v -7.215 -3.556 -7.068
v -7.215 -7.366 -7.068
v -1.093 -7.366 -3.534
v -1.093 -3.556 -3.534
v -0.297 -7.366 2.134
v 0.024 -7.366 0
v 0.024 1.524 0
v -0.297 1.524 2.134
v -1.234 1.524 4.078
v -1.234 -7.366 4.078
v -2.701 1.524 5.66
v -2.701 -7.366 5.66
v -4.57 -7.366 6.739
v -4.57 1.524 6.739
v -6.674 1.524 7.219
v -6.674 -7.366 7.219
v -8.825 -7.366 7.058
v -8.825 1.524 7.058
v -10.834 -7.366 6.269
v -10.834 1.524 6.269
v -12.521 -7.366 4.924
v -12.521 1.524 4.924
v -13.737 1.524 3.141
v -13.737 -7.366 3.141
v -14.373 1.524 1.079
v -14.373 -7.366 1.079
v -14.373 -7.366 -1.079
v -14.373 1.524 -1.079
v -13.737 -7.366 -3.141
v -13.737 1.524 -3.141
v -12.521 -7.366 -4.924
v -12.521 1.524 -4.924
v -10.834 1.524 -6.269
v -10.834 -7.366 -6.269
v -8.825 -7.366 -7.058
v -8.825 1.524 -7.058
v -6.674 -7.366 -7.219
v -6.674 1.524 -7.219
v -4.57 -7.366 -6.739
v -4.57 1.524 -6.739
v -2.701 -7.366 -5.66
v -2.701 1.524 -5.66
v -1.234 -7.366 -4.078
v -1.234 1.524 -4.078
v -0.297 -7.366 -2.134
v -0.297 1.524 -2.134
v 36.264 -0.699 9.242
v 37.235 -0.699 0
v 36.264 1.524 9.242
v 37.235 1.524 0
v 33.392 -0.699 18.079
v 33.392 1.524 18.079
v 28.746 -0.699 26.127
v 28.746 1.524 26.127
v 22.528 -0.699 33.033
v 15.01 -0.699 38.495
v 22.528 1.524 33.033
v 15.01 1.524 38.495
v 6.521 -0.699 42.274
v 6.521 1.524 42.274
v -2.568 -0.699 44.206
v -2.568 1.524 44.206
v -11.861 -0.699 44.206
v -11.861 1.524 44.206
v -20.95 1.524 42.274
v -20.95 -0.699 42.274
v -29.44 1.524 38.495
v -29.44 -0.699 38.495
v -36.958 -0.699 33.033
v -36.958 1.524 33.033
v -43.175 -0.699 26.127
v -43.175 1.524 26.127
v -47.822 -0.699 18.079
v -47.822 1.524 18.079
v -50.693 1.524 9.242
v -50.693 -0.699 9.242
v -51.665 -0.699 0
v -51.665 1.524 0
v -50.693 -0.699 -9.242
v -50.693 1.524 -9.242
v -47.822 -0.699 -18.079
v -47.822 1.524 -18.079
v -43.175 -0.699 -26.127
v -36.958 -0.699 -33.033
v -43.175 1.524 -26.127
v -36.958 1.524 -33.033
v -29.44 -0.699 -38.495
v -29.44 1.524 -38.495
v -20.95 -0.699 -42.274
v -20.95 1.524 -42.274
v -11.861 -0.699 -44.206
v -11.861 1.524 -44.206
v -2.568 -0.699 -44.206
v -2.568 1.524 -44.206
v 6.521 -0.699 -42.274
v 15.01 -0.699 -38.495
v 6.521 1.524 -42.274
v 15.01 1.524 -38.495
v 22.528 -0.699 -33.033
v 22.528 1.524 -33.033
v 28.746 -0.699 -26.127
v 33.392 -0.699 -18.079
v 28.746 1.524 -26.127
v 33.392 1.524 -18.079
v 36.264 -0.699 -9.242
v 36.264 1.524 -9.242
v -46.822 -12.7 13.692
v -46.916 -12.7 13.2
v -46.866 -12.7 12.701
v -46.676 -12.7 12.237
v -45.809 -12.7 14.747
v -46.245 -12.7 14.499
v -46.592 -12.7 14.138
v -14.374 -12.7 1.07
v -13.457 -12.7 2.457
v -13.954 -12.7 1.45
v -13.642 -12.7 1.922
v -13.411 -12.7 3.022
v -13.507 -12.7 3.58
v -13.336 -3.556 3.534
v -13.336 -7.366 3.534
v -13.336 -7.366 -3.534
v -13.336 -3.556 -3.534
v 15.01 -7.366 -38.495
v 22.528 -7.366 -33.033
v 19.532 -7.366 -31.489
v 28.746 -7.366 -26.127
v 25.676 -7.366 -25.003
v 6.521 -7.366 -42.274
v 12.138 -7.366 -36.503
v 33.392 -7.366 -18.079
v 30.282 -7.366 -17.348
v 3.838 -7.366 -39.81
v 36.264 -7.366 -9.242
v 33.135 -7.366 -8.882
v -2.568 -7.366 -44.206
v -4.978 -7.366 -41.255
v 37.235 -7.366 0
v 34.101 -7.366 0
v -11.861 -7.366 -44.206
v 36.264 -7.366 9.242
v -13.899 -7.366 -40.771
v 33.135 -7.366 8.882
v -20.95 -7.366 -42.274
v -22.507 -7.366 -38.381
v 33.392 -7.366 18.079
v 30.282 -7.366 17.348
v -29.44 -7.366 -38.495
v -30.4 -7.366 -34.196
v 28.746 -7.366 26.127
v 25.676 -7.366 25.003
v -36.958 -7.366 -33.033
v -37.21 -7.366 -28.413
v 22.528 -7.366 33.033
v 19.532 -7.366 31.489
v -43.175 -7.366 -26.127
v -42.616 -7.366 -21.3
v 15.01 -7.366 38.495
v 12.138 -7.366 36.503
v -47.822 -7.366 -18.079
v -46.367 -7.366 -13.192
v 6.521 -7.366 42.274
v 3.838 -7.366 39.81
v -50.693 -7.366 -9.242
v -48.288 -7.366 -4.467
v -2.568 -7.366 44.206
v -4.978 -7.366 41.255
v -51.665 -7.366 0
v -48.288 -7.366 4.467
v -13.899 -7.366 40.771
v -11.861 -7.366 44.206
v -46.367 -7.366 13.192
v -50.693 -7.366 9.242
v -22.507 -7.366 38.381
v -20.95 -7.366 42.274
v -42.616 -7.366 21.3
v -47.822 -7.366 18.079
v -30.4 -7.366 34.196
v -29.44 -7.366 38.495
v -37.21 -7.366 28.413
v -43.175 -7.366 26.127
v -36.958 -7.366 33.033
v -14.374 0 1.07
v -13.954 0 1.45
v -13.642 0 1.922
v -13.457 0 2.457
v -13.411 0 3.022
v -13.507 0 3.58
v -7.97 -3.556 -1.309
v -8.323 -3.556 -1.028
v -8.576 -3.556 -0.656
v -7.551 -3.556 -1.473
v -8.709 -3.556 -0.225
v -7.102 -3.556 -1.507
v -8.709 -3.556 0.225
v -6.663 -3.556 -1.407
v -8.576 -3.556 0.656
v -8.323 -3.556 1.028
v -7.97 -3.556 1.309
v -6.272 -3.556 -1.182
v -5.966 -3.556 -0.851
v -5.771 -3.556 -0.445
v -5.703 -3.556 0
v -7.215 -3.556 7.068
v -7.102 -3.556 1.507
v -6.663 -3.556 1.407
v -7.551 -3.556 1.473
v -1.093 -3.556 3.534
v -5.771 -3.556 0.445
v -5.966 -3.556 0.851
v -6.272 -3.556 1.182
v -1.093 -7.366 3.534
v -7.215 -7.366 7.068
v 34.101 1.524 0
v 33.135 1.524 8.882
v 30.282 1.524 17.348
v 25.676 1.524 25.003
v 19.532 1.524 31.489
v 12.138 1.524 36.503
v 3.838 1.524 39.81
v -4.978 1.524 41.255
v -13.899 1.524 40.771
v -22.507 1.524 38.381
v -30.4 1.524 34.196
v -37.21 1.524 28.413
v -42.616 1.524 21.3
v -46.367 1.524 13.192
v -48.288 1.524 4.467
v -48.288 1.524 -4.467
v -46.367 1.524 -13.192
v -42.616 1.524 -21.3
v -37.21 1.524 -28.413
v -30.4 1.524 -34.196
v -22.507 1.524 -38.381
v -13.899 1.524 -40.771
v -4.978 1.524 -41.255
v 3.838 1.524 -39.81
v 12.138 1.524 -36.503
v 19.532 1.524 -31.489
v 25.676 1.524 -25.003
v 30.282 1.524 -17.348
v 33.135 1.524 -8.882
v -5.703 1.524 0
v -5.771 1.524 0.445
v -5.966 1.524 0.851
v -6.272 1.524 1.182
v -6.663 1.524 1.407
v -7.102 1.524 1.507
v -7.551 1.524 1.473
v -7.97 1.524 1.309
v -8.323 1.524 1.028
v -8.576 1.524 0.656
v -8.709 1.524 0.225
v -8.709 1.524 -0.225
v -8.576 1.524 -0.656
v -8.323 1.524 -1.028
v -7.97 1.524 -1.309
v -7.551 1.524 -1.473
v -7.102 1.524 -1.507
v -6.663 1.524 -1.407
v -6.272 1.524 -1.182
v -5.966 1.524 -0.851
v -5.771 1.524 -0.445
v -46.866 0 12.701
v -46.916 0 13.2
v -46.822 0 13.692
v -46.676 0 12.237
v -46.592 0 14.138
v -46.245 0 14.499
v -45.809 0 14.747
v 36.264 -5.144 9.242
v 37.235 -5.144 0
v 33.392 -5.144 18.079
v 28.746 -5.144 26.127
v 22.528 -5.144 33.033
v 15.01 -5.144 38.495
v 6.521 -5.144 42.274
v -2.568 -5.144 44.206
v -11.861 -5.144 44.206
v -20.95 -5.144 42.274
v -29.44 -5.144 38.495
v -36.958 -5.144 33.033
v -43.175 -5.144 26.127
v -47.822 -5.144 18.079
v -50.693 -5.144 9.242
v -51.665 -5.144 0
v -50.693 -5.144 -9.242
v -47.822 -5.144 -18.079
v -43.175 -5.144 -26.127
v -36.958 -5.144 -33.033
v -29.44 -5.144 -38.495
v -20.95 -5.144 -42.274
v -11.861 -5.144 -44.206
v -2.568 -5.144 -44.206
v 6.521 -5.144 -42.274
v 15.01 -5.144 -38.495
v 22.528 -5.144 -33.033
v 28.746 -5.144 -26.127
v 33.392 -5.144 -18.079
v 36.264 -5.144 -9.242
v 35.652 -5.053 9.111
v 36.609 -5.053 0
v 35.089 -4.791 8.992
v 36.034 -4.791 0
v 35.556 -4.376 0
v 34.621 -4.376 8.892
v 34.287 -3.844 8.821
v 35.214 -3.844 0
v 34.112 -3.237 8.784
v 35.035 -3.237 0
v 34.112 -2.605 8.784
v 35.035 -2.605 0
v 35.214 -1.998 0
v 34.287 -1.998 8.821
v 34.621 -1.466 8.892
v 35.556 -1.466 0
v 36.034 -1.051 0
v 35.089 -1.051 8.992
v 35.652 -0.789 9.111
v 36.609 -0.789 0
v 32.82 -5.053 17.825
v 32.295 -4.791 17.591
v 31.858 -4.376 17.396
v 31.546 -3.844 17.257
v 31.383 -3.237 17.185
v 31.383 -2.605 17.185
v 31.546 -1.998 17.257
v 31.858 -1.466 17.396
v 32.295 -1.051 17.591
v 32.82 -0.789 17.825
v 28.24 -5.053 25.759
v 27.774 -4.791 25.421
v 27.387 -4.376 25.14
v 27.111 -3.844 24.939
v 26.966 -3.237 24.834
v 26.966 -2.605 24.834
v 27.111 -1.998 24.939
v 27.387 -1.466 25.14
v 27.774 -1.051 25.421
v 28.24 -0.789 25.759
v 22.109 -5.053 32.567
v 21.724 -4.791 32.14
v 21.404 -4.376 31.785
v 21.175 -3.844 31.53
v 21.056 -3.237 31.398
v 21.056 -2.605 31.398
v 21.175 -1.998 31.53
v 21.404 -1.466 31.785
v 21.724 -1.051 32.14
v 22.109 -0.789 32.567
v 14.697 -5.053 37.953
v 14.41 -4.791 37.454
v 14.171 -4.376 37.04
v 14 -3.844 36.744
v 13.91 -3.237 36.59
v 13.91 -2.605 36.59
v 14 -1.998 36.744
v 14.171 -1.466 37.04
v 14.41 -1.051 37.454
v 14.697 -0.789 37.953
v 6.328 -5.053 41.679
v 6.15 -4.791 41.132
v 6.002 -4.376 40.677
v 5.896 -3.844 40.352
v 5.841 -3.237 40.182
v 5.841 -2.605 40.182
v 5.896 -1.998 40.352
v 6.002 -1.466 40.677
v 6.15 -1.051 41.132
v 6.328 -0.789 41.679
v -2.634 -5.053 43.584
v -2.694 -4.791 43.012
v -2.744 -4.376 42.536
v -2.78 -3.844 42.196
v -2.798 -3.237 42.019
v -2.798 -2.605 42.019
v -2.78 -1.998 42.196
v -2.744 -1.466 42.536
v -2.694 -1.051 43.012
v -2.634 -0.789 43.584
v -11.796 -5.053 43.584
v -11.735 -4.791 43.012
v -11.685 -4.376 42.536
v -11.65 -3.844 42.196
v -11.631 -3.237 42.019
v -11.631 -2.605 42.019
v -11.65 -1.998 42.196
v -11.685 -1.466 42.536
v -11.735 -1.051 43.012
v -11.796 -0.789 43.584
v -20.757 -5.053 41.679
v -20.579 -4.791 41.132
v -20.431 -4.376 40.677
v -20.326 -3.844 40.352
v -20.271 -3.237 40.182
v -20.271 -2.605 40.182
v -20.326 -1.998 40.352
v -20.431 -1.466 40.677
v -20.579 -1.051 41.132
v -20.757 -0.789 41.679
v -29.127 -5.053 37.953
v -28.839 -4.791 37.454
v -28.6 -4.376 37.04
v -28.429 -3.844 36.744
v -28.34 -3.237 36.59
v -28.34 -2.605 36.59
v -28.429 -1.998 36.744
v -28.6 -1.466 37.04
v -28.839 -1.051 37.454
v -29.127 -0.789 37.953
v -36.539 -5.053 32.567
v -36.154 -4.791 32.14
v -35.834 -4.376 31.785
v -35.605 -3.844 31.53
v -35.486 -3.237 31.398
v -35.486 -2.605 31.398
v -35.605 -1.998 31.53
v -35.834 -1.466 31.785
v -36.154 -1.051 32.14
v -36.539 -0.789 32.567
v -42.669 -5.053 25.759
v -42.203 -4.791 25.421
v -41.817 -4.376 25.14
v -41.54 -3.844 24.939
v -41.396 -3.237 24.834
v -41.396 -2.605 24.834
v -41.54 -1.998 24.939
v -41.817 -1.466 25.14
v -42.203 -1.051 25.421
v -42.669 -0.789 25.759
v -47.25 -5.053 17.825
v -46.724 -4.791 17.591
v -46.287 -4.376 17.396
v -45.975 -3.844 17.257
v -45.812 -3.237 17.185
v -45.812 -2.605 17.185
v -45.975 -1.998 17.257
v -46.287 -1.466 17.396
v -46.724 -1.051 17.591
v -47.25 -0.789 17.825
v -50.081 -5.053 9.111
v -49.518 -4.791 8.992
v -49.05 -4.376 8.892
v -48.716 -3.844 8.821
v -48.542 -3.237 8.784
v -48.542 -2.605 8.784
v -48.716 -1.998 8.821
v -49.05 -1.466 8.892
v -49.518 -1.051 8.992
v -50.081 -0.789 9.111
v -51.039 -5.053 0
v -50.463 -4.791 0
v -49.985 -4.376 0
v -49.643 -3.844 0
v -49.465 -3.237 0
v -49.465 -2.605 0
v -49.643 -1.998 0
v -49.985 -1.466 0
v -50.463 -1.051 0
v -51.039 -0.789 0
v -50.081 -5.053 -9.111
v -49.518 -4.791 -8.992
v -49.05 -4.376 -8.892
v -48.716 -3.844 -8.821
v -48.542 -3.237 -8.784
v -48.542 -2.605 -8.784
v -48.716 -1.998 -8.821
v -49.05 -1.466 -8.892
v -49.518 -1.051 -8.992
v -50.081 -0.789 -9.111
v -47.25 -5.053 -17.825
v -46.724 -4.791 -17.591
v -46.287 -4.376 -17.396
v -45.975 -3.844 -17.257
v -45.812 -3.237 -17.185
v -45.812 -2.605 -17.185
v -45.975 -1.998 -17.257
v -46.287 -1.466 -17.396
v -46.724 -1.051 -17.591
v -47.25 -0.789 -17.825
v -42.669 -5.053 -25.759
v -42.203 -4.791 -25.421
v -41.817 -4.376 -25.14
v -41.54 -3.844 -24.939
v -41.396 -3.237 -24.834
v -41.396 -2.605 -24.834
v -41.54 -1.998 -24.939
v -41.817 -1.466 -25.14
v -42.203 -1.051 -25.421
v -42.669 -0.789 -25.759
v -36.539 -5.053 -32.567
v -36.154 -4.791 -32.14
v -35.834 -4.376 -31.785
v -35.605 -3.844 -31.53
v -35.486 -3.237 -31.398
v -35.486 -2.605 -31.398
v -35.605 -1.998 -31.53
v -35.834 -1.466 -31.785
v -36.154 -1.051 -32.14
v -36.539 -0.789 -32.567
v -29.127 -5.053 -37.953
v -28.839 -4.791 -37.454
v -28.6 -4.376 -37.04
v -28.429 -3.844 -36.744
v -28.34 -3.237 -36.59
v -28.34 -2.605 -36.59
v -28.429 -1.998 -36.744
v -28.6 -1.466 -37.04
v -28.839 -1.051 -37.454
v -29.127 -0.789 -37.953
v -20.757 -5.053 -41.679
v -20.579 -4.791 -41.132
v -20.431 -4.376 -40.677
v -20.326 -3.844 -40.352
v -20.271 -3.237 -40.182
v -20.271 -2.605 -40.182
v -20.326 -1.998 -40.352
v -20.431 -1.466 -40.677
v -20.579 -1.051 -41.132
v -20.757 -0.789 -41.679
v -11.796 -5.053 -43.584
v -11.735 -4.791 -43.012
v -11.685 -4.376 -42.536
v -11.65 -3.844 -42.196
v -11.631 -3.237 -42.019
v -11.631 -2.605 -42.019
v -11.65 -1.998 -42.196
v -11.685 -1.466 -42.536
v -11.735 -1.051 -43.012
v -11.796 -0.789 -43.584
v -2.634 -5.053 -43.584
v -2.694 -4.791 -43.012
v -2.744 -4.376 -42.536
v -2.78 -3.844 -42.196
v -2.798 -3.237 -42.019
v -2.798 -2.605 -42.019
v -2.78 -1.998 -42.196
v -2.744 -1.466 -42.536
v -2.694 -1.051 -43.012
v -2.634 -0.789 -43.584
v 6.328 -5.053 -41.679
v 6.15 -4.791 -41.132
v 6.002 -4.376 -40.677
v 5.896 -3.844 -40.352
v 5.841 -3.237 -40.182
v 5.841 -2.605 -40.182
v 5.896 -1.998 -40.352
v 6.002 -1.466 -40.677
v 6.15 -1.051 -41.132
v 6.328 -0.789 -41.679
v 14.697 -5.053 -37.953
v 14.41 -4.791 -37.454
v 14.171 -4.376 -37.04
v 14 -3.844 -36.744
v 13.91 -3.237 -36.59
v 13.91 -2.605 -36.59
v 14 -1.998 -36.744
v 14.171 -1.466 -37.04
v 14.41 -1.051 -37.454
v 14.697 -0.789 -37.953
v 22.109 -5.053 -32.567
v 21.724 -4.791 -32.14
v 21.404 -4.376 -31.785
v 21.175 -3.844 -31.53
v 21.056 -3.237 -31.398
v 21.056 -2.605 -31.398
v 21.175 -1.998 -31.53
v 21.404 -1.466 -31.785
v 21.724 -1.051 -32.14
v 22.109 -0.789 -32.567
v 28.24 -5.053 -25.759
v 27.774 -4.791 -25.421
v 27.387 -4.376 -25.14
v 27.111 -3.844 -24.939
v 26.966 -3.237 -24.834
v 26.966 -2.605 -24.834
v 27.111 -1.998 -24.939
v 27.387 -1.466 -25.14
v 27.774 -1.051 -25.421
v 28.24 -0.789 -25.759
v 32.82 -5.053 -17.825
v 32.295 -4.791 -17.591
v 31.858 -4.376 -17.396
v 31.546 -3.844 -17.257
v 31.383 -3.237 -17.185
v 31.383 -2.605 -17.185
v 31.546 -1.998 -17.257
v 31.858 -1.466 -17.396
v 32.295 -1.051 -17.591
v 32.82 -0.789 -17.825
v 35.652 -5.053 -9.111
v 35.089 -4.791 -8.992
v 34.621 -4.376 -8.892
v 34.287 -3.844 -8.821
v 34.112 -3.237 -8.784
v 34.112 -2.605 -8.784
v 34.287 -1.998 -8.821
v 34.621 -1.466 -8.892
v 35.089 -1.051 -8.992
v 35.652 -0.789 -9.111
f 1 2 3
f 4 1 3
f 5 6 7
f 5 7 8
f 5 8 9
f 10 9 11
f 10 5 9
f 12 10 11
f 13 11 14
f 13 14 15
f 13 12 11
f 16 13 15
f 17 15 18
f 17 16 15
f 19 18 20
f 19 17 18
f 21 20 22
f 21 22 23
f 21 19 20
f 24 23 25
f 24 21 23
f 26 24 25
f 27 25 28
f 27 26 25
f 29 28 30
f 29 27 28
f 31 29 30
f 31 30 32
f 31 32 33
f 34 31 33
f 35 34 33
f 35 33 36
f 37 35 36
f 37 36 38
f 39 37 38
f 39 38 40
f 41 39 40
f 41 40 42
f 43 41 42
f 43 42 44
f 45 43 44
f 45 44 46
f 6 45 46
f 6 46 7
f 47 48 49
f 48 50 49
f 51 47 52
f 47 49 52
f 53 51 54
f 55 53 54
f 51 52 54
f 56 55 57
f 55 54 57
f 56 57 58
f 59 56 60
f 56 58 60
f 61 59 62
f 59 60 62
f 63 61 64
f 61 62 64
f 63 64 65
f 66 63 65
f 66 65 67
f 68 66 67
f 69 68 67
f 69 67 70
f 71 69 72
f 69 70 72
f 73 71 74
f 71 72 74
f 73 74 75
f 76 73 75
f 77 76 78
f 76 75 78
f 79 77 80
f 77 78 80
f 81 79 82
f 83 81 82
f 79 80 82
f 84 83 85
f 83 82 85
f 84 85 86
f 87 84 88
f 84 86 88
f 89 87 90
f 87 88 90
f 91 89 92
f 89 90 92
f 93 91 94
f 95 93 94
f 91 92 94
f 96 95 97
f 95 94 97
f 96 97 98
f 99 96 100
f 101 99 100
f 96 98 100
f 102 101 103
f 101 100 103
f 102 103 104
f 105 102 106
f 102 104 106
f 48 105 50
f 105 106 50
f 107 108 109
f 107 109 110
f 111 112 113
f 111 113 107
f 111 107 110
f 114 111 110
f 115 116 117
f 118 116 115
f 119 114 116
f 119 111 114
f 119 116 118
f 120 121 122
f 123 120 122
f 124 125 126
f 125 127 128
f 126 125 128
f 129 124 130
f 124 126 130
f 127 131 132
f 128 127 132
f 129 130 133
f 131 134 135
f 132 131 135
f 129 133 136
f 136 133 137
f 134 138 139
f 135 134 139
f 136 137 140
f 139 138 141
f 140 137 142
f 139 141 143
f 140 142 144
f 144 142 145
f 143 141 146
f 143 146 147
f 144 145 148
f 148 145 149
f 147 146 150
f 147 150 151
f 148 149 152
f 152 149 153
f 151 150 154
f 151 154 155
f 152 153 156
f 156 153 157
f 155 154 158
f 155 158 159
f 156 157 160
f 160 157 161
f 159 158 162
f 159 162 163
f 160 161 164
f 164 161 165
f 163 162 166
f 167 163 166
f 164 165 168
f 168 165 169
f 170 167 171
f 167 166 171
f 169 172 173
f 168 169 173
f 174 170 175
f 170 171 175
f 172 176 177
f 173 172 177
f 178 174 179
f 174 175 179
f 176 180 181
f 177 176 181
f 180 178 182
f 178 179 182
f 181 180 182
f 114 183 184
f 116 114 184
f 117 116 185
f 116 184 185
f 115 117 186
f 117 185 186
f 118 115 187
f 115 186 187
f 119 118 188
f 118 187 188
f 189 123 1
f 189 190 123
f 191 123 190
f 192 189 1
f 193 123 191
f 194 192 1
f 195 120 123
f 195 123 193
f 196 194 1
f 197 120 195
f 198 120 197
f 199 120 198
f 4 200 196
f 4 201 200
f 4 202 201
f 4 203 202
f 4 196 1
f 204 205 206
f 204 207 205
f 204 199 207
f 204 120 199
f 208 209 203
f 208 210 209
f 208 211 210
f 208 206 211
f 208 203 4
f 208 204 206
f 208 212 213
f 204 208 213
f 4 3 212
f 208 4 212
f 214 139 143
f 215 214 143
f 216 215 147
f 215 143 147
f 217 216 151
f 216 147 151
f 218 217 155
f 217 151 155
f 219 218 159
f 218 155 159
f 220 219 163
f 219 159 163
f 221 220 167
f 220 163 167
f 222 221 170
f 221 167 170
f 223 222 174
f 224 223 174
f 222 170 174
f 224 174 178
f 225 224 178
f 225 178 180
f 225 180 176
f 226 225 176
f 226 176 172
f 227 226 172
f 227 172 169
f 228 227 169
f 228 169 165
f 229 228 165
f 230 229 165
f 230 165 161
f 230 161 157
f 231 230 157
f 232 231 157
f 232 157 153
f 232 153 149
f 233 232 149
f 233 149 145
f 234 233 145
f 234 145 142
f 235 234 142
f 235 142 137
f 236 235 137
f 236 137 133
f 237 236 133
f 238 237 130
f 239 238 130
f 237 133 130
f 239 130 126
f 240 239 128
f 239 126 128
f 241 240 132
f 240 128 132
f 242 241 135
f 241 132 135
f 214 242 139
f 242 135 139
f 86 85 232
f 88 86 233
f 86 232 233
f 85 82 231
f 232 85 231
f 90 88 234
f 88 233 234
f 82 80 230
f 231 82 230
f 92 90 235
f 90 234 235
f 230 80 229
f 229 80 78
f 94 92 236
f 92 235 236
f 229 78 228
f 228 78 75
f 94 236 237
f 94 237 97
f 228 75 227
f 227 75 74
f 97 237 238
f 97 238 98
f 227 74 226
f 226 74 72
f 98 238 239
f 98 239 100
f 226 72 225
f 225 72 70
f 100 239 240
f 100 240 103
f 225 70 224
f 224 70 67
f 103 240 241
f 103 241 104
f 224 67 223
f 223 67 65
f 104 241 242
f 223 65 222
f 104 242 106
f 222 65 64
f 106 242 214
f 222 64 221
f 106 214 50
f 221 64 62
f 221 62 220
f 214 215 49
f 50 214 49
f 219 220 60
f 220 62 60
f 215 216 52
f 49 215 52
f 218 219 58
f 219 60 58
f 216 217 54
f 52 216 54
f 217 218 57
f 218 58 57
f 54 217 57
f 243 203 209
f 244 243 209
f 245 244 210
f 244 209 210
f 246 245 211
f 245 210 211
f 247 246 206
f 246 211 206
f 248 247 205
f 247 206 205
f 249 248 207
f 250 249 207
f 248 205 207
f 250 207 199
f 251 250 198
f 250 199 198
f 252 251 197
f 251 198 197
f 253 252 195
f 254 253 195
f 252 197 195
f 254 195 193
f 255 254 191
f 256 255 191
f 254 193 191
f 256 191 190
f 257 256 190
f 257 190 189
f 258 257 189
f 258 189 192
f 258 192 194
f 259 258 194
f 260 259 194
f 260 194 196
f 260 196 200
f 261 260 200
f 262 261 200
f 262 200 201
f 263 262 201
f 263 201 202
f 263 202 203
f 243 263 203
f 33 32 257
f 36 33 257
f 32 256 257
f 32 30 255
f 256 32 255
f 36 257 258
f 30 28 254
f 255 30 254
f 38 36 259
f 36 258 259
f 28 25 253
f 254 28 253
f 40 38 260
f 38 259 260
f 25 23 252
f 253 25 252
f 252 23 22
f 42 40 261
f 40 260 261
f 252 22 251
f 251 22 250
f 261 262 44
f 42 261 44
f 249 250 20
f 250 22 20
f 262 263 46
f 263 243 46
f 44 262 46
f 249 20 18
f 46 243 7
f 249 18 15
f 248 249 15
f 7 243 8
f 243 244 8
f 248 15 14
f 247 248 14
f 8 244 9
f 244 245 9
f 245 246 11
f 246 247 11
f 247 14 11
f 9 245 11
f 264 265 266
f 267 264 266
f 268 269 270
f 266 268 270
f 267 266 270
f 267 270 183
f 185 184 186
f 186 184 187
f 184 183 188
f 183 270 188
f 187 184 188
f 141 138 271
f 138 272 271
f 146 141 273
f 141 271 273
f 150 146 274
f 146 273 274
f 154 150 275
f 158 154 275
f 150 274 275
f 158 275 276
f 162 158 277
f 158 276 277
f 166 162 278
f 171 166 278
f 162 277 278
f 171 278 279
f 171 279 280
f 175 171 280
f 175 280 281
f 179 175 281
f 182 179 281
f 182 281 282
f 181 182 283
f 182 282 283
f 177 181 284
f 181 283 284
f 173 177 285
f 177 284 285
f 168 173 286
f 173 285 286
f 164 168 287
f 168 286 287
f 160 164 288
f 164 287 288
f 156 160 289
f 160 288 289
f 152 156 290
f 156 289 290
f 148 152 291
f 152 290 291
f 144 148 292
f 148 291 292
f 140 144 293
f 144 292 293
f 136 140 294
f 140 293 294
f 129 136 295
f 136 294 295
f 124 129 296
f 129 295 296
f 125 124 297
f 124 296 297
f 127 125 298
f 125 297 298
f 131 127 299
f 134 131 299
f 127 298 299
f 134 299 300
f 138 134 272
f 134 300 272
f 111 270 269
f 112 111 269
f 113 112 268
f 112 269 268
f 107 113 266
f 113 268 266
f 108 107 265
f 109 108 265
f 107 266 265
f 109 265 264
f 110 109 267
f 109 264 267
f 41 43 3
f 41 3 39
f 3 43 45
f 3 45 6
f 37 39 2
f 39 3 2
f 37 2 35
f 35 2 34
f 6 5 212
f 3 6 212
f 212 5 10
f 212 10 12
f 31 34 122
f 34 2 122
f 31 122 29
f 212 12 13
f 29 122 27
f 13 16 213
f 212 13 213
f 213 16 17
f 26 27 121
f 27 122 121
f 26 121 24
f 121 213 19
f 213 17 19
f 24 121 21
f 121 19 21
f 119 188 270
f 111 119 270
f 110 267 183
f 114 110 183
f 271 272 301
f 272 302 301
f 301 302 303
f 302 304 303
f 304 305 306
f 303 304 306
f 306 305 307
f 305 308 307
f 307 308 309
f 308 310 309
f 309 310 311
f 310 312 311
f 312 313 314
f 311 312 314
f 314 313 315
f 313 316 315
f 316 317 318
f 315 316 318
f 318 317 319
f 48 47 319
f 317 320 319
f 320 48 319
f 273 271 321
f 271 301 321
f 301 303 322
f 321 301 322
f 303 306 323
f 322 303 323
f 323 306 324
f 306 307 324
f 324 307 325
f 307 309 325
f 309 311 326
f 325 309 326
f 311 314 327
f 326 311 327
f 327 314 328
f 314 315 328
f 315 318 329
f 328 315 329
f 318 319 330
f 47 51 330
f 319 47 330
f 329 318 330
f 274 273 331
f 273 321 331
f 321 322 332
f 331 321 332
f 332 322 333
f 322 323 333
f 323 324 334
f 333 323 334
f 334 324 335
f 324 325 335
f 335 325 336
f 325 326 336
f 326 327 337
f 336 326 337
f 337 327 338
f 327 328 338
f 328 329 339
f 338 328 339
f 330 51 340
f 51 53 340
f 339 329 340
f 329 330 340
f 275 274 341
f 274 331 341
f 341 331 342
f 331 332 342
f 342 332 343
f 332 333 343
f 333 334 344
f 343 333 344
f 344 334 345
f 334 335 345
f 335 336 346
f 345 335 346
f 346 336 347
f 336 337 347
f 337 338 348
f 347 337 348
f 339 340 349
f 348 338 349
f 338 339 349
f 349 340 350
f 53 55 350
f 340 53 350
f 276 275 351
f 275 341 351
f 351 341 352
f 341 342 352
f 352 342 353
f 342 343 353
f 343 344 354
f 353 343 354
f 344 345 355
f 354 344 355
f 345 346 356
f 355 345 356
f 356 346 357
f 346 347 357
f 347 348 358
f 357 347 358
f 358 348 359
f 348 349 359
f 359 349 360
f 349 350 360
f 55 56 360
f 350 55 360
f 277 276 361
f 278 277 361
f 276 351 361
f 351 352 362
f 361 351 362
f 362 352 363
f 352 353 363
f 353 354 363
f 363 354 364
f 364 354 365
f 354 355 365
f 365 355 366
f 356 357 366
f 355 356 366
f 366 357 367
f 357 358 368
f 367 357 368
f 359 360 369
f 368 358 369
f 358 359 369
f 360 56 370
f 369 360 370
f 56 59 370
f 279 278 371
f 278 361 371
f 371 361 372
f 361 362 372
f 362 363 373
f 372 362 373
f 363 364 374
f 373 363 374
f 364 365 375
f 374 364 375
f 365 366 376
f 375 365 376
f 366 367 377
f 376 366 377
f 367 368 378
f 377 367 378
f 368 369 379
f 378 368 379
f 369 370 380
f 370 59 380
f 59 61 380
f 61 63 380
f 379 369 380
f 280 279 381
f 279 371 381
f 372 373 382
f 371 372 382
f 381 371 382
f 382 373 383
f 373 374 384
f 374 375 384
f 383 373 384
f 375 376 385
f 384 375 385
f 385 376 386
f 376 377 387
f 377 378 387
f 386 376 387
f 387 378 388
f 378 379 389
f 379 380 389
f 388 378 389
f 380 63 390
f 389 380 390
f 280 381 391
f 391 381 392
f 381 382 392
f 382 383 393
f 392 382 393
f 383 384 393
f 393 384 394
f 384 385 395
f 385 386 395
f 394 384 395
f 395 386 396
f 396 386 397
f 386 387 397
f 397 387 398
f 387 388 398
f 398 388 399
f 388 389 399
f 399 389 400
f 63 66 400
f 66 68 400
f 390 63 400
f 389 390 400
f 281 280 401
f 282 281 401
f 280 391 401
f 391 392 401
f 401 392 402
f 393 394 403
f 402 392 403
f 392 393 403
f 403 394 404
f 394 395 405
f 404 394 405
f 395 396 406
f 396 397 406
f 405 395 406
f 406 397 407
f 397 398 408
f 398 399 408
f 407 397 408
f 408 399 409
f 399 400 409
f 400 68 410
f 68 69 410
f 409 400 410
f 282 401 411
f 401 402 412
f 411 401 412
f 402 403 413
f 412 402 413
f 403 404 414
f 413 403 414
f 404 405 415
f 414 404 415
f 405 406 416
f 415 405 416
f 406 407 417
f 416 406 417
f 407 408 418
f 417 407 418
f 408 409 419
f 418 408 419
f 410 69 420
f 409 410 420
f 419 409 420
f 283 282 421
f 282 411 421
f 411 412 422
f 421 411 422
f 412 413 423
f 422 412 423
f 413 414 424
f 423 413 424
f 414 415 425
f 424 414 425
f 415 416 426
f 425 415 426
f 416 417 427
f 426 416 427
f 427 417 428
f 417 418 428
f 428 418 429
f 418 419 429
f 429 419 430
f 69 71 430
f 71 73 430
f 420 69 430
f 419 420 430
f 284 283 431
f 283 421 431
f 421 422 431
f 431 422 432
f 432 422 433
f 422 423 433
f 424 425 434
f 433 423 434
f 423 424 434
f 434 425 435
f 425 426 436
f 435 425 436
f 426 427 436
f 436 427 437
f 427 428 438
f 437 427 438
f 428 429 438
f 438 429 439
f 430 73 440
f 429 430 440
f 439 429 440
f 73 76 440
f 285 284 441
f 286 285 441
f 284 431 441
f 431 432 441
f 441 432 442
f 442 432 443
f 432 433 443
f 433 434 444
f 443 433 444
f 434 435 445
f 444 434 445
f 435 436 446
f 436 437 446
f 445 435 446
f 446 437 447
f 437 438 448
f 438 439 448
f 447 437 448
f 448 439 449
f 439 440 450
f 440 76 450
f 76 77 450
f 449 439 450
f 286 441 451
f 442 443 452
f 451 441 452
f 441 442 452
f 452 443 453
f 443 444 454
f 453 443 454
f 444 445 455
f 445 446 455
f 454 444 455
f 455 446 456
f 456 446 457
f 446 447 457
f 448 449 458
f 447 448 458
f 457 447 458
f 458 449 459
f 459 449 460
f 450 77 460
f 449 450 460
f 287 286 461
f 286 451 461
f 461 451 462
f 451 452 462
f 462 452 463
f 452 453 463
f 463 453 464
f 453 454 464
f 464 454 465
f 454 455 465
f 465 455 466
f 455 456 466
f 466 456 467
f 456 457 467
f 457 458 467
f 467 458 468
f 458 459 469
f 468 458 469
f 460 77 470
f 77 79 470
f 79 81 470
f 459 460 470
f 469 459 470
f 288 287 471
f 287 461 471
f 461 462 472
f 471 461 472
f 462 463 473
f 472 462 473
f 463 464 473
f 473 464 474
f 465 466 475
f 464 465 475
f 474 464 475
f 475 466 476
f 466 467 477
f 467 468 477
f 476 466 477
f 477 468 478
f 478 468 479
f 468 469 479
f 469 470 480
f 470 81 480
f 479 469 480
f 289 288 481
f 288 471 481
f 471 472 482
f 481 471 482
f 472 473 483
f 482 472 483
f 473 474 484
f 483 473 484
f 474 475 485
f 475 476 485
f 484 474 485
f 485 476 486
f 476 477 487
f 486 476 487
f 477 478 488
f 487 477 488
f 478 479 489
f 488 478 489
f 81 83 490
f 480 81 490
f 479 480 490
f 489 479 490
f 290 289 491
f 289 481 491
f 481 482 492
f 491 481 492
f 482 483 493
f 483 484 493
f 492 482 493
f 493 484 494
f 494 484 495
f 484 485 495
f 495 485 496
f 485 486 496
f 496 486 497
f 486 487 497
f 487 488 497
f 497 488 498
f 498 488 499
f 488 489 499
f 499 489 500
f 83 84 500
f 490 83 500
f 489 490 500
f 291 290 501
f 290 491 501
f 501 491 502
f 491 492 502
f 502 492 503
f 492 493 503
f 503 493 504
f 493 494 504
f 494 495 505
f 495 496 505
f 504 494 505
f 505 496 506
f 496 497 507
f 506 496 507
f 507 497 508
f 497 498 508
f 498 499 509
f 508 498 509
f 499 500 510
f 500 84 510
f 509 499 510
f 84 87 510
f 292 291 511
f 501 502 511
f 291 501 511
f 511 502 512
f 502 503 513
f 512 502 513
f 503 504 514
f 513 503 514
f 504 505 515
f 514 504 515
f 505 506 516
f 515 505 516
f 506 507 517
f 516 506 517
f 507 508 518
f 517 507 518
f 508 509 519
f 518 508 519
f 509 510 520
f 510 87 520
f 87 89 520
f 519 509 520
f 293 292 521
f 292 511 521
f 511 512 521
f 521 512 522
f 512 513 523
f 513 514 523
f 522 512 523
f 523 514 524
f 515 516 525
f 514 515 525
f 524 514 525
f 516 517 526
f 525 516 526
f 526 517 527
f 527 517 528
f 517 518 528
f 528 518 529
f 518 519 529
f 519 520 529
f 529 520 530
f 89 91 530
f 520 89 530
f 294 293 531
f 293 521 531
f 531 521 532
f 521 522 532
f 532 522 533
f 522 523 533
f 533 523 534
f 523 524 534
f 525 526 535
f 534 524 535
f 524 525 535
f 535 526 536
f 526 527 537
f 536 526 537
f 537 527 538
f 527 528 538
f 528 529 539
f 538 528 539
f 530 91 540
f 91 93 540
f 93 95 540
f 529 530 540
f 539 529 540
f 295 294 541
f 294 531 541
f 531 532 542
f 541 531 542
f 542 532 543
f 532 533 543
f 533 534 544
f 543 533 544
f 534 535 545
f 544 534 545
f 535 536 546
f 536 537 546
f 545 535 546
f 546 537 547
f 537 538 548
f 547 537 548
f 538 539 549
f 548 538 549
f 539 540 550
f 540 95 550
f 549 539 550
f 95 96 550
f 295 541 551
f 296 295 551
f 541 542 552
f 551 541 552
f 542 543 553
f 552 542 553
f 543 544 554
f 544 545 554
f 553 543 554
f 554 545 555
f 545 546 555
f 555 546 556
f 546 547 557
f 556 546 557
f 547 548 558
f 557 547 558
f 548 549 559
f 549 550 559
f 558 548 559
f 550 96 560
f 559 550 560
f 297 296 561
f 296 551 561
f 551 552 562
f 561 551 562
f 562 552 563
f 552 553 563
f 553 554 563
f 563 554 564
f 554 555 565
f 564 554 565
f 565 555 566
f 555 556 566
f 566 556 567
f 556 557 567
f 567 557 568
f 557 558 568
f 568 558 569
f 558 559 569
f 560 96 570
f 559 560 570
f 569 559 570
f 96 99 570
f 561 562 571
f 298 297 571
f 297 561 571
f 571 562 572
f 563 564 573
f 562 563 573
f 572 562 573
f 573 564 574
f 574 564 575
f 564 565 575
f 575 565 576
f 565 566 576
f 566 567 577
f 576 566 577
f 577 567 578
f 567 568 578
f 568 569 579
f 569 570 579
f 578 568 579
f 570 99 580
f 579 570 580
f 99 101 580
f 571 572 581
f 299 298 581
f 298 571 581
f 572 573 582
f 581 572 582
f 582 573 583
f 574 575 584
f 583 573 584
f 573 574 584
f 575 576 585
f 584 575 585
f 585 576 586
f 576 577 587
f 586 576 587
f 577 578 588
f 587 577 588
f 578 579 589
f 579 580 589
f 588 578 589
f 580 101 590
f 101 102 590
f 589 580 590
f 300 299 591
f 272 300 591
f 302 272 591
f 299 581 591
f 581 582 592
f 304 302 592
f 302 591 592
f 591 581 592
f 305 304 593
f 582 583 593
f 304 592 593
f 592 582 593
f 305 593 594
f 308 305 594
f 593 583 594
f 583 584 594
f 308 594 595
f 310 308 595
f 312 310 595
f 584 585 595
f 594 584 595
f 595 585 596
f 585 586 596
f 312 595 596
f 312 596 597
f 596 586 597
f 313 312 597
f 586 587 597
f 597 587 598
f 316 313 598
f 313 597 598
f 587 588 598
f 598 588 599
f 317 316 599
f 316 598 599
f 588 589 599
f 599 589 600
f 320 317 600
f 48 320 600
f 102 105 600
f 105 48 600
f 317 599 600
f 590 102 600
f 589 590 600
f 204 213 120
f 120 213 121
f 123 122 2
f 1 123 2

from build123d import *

# Parameters (mm, degrees)
F2_R     = 41.315497
F2_R_2   = 7.239
F3_DEPTH = 25.4
F2_R_3   = 1.5113
F4_DEPTH = 3.81
F5_DEPTH = 127
F7_DEPTH = 12.7


with BuildPart() as f1:
    # F0 (on Top) → F1 (revolve)
    with BuildSketch(Plane.XY):
        with BuildLine():
            Line((37.235339, 1.523997), (30.885339, 1.523997))
            Line((30.885339, 1.523997), (30.885339, -7.366003))
            Line((30.885339, -7.366003), (37.235339, -7.366003))
            Line((37.235339, -7.366003), (37.235339, -5.143503))
            ThreePointArc((37.235339, -5.143503), (35.012839, -2.921003), (37.235339, -0.698503))
            Line((37.235339, -0.698503), (37.235339, 1.523997))
        make_face()
        Polygon((1.421339, 1.523997), (-7.214661, 1.523997), (-7.214661, -7.366003), (1.421339, -7.366003), (30.885339, -7.366003), (30.885339, 1.523997), align=None)
    revolve(axis=Axis((-7.214661, -2.921003, 0), (0, -1, 0)))

    # F2 (on face) → F3 (cut)
    with BuildSketch(Plane.XZ.offset(7.366003)):
        with Locations((-7.214661, 0)):
            Circle(F2_R)
        with Locations((-7.214661, 0)):
            Circle(F2_R_2, mode=Mode.SUBTRACT)
    extrude(amount=-F3_DEPTH, mode=Mode.SUBTRACT)

    # F2 (on face) → F4 (cut)
    with BuildSketch(Plane.XZ.offset(7.366003)):
        Polygon((-1.093261, -3.534192), (-1.093261, 3.534192), (-7.214661, 7.068384), (-13.336061, 3.534192), (-13.336061, -3.534192), (-7.214661, -7.068384), align=None)
        with Locations((-7.214661, 0)):
            Circle(F2_R_3, mode=Mode.SUBTRACT)
    extrude(amount=-F4_DEPTH, mode=Mode.SUBTRACT)

    # F2 (on face) → F5 (cut)
    with BuildSketch(Plane.XZ.offset(7.366003)):
        with Locations((-7.214661, 0)):
            Circle(F2_R_3)
    extrude(amount=-F5_DEPTH, mode=Mode.SUBTRACT)


with BuildPart() as f7:
    # F6 (on Front) → F7 (new body)
    with BuildSketch(Plane.XZ):
        with BuildLine():
            ThreePointArc((-14.37408, 1.070443), (-13.532331, 2.184016), (-13.506631, 3.579698))
            Line((-13.506631, 3.579698), (-45.808824, 14.746556))
            ThreePointArc((-45.808824, 14.746556), (-46.822116, 13.692285), (-46.676273, 12.237301))
            Line((-46.676273, 12.237301), (-14.37408, 1.070443))
        make_face()
    extrude(amount=F7_DEPTH)


solid = Compound([f1.part, f7.part])
